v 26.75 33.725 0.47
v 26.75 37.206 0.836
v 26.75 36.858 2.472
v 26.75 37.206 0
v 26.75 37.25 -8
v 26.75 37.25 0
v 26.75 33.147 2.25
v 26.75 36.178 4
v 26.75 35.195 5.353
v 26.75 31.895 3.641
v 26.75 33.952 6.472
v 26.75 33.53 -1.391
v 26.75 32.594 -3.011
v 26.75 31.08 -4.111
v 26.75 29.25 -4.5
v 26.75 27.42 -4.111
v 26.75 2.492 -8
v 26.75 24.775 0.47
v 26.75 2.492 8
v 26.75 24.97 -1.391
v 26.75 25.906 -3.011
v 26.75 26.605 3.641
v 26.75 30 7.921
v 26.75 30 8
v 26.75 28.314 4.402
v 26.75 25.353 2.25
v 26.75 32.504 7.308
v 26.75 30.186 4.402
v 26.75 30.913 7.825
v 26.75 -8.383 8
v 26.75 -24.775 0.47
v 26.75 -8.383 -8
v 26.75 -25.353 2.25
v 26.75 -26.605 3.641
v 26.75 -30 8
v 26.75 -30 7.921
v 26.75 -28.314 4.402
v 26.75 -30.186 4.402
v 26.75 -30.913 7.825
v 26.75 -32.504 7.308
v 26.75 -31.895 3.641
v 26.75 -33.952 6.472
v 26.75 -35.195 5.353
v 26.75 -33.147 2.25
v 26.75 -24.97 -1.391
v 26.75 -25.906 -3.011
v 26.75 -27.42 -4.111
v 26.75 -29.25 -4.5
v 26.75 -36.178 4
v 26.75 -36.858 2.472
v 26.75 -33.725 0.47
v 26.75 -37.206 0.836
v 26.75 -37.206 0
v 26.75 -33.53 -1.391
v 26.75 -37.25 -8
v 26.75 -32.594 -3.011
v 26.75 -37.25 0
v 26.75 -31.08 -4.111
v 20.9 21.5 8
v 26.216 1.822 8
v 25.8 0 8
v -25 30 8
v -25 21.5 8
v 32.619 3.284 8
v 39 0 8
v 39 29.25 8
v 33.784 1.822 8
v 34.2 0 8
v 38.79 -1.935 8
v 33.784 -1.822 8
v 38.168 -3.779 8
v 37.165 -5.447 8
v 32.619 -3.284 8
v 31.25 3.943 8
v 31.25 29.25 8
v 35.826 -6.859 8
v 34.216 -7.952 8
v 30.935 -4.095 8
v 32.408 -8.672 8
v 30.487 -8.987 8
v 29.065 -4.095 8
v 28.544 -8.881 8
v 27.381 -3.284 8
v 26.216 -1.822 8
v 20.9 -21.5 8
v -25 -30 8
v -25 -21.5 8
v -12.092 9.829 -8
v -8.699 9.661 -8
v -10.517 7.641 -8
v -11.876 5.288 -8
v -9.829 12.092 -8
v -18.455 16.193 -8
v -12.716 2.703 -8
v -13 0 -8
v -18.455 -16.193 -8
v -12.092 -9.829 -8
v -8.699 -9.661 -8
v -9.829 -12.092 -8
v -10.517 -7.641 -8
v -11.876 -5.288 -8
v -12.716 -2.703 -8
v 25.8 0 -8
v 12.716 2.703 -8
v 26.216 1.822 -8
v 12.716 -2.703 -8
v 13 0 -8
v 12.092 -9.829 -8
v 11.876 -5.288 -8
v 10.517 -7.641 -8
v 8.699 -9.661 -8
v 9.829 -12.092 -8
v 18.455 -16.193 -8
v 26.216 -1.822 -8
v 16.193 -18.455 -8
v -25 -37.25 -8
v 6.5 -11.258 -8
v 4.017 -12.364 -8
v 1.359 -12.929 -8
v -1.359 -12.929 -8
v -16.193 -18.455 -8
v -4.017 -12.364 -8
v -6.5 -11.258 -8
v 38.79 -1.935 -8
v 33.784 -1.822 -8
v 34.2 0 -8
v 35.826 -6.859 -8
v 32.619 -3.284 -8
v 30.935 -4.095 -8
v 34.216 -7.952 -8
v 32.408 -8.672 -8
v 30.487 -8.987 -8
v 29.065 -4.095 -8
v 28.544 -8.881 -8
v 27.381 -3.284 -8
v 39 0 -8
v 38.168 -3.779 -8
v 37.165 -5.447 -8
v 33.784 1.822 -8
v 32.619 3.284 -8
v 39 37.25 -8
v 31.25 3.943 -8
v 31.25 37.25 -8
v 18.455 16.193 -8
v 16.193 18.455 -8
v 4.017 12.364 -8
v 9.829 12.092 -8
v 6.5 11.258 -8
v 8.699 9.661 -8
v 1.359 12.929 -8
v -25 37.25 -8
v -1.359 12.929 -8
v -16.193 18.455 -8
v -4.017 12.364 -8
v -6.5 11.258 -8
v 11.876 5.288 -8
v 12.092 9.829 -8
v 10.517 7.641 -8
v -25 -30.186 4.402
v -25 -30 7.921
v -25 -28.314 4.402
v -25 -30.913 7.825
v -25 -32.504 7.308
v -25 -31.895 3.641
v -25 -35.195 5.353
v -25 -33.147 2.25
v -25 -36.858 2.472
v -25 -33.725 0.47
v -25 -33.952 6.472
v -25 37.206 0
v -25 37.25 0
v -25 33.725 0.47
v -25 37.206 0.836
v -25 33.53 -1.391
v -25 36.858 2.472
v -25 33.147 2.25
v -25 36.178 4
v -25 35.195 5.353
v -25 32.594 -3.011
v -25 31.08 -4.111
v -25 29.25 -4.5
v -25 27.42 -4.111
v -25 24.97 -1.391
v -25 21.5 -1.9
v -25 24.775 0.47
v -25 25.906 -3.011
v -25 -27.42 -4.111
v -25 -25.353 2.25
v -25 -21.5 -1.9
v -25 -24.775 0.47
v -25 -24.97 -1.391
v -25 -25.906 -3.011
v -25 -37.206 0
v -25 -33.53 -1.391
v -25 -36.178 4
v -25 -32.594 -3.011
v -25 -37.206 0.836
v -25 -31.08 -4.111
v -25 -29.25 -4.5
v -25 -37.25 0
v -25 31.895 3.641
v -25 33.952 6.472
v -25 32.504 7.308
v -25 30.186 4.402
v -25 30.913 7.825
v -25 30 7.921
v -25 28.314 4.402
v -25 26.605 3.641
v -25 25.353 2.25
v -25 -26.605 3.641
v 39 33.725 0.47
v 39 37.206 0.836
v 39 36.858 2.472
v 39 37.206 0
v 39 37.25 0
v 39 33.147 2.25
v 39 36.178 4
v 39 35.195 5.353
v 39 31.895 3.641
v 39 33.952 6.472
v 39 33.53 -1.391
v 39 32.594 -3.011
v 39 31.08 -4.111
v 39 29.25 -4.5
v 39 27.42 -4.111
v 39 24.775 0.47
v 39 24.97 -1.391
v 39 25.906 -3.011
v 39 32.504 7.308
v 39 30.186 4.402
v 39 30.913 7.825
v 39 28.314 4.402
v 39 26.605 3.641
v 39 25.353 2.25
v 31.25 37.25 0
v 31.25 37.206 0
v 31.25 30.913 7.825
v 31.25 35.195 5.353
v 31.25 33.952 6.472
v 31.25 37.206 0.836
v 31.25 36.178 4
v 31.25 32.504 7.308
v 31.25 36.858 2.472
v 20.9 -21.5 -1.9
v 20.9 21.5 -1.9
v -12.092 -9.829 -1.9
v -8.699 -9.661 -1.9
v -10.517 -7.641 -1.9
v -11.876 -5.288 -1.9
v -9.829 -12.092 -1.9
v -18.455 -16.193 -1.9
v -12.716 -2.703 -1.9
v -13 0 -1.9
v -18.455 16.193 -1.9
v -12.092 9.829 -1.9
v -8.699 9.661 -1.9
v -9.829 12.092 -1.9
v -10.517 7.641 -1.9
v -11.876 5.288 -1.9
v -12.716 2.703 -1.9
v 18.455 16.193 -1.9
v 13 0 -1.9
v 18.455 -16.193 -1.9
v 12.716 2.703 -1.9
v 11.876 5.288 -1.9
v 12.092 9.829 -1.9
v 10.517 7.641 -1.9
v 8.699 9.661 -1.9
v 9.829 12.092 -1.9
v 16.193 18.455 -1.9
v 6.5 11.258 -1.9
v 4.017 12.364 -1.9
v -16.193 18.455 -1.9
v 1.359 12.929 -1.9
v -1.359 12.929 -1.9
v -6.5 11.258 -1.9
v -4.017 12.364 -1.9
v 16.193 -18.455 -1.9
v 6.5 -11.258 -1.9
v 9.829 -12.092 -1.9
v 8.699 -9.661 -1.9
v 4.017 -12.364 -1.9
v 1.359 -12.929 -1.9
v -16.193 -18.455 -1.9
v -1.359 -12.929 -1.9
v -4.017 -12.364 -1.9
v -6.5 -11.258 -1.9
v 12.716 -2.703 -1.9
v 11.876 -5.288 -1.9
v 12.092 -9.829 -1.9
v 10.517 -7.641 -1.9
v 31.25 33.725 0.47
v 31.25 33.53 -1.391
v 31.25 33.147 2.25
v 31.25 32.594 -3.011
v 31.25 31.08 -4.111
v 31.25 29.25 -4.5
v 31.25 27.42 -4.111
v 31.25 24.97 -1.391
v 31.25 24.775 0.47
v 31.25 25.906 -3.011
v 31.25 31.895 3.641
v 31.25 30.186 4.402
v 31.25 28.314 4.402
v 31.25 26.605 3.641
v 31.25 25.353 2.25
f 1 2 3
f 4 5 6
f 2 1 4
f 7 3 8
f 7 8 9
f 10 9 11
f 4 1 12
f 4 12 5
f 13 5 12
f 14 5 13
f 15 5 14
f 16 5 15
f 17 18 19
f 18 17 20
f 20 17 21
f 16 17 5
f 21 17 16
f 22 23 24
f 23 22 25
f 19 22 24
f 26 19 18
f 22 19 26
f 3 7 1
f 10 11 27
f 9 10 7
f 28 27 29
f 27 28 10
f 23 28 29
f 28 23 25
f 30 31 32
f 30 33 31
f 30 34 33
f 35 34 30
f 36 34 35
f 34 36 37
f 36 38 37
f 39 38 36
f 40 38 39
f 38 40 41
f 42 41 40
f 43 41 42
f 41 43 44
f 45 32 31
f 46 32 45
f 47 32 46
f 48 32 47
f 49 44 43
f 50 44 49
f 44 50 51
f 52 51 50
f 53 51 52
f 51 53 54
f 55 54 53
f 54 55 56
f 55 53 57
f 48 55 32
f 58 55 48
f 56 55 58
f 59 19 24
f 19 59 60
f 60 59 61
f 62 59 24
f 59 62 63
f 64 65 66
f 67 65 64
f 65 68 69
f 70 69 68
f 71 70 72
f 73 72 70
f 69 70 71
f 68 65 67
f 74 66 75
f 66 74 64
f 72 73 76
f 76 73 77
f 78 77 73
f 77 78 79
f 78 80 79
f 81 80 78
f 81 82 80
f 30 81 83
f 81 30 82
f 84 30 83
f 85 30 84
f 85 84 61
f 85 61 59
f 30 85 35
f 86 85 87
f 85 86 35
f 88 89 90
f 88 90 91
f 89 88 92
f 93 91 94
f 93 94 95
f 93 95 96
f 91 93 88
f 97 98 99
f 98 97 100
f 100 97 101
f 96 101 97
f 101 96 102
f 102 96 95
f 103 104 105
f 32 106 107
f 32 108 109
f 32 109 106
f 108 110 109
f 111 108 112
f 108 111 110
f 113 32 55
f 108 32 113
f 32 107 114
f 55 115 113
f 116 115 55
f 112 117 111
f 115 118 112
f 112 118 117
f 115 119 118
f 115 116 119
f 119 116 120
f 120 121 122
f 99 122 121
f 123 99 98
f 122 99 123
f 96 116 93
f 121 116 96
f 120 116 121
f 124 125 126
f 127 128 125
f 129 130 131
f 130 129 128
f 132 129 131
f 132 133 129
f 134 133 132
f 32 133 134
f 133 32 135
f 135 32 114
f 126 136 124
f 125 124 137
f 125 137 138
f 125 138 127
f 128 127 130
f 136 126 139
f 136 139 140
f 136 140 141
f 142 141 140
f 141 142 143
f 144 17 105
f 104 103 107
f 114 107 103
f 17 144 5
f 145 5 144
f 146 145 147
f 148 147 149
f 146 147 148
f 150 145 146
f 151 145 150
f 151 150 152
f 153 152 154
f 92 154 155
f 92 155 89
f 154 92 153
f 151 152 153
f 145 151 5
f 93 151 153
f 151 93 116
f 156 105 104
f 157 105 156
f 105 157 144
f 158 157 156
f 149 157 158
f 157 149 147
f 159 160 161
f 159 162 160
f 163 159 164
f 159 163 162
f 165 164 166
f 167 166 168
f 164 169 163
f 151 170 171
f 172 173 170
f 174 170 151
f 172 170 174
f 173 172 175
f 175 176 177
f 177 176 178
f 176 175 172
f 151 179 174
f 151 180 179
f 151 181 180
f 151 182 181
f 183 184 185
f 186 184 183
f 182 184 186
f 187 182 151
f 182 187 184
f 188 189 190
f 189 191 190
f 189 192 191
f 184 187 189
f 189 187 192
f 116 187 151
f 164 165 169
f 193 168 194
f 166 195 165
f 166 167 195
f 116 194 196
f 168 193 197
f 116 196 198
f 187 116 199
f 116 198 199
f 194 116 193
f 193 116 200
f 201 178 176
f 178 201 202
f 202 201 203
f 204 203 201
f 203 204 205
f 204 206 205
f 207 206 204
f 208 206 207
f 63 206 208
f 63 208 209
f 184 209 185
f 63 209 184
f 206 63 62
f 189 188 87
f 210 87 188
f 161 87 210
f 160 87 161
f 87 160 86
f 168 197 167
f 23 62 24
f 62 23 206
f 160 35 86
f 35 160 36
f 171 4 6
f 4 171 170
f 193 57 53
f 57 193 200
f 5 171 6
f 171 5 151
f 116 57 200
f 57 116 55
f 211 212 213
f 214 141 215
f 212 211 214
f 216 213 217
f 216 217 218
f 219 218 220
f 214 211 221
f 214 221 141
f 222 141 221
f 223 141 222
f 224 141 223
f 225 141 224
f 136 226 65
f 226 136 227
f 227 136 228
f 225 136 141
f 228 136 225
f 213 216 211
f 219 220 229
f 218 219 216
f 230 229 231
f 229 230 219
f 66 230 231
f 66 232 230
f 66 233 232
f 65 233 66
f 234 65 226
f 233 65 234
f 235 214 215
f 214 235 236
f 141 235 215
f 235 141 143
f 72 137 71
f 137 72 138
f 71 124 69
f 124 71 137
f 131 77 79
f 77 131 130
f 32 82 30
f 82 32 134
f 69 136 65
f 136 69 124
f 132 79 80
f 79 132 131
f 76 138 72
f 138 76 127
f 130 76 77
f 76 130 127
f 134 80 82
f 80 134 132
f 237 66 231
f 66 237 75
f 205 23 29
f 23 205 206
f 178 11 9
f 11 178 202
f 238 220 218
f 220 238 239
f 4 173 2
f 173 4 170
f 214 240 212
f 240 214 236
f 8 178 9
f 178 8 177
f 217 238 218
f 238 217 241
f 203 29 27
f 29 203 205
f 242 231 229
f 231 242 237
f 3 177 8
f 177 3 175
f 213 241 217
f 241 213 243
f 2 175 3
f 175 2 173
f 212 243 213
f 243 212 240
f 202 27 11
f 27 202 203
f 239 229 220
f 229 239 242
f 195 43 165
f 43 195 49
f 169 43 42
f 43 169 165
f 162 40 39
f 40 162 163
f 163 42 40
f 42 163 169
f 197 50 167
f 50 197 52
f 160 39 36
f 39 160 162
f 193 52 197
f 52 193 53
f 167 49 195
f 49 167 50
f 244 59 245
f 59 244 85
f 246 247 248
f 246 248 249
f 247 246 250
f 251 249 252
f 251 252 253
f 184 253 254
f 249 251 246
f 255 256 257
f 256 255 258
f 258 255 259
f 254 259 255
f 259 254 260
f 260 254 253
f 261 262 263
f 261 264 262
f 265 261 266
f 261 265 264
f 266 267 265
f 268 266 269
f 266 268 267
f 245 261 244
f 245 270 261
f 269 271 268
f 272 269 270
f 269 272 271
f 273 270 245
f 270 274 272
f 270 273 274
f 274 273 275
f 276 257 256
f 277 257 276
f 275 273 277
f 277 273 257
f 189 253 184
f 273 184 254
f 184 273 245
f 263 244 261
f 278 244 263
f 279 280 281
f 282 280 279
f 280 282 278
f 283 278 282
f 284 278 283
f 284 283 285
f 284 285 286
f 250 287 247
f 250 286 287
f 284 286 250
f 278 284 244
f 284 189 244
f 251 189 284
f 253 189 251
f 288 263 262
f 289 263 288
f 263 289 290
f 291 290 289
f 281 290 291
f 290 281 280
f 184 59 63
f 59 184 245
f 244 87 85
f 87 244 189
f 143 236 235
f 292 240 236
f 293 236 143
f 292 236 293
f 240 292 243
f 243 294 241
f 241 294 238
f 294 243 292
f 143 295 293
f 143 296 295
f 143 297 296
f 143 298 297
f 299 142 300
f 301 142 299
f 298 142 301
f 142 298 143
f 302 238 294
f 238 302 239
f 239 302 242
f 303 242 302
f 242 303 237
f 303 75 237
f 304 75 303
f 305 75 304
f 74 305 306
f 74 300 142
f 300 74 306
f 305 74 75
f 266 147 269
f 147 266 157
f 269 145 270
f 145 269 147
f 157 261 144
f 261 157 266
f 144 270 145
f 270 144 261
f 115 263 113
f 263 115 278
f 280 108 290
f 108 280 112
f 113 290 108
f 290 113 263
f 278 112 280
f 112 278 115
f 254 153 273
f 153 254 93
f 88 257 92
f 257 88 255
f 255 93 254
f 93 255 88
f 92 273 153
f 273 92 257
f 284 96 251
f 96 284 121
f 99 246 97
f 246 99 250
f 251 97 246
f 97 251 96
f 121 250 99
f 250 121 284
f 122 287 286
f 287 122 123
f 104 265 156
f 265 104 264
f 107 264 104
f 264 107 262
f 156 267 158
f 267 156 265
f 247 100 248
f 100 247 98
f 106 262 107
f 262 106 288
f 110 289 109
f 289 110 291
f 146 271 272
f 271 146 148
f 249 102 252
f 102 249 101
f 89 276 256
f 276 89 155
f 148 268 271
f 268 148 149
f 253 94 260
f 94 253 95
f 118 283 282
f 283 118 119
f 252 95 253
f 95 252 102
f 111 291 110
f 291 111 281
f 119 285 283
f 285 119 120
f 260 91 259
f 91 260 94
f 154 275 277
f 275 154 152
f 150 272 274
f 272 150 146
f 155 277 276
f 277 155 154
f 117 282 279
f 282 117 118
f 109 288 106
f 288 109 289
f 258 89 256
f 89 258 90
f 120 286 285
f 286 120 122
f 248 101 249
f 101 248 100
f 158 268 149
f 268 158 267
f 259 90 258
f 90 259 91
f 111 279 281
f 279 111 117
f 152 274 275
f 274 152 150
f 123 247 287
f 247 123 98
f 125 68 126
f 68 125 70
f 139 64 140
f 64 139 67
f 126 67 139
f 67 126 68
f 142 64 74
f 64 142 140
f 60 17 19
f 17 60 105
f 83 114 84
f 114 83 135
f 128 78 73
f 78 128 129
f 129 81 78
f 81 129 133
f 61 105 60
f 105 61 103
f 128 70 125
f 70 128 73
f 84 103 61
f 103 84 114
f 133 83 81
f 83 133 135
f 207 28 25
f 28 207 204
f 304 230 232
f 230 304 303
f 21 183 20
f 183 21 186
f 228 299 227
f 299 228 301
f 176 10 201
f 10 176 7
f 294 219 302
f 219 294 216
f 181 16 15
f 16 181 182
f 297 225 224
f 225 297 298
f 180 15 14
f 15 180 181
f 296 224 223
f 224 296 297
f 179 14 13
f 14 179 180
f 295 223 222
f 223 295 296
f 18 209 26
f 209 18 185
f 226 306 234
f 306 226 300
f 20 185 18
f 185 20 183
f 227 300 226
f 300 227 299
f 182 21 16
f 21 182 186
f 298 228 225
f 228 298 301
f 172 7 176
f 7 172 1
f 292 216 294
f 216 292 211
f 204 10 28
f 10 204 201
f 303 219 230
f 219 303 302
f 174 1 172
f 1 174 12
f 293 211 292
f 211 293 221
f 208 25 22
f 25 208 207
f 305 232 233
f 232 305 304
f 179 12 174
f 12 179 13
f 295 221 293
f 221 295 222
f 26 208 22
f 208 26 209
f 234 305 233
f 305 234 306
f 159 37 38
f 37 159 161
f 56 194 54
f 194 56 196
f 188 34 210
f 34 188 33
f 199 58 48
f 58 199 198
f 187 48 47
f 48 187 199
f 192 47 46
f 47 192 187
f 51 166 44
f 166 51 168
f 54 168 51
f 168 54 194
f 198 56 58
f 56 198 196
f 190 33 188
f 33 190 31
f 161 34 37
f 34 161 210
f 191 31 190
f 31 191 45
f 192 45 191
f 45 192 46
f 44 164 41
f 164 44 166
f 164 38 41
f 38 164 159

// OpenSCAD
// file: functions.scad
// PRUSA Mendel  
// Functions used in many files
// GNU GPL v3
// Josef Průša
// josefprusa@me.com
// prusadjs.cz
// http://www.reprap.org/wiki/Prusa_Mendel
// http://github.com/prusajr/PrusaMendel


module nut(d,h,horizontal=true){
cornerdiameter =  (d / 2) / cos (180 / 6);
cylinder(h = h, r = cornerdiameter, $fn = 6);
if(horizontal){
for(i = [1:6]){
	rotate([0,0,60*i]) translate([-cornerdiameter-0.2,0,0]) rotate([0,0,-45]) cube(size = [2,2,h]);
}}
}

// Based on nophead research
module polyhole(d,h) {
    n = max(round(2 * d),3);
    rotate([0,0,180])
        cylinder(h = h, r = (d / 2) / cos (180 / n), $fn = n);
}




module roundcorner(diameter){
	difference(){
		cube(size = [diameter,diameter,99], center = false);
		translate(v = [diameter, diameter, 0]) cylinder(h = 100, r=diameter, center=false,$fn = max(3*diameter,20));
	}
}
// file: configuration.scad
// PRUSA Mendel  
// Configuration file
// GNU GPL v2
// Josef Pra
// josefprusa@me.com
// prusadjs.cz
// http://www.reprap.org/wiki/Prusa_Mendel
// http://github.com/prusajr/PrusaMendel


// PLEASE SELECT ONE OF THE CONFIGURATIONS BELOW
// BY UN-COMMENTING IT


variant=0; //0 for metric
//variant=1; //1 for SAE
if(variant==0){
echo("variant: metric");
}else if(variant==1){
echo("variant: sae");
} else{
echo("WARNING: INVALID CONFIGURATION");
}




vars=[
//[m8_dia,m8_nut, m4_dia, m4_nut, m3_dia, m3_nut, bush_dia, mot_shaft, bush_rod, bush_outerdia, bush_length, m5_dia, m5_nut]
[9, 16.4, 5,9, 4.4, 7, 11, 5.3, 8, 16, 11, 5.6, 10],//metric
[9,15.7,5.5,10.6,5.5,10.6,11.5,5.3,7.9375,16,11,5.6, 10]//SAE
];


//BUSHING TYPE Can generate three versions
// 1 - regular old ones
// 2 - helical ones
// 3 - holders for brass or any other bought bushings
bushing_type = 2;


//Round corner diameter
round_corner_diameter = 8;


//Thin wall size
layer_height = 0.4;
perimeter_width_over_thicknes = 1.6;
infill_widht_over_thickness = 1.55;
thin_wall = 2*(perimeter_width_over_thicknes*layer_height+infill_widht_over_thickness*layer_height);
if(thin_wall<2){
	echo("Check thin wall size, its below 2mm!");
}
echo(thin_wall);


//DO NOT TOUCH THIS SECTION!
m8_diameter = vars[variant][0];
m8_nut_diameter = vars[variant][1];
m4_diameter = vars[variant][2];
m4_nut_diameter = vars[variant][3];
m3_diameter = vars[variant][4];
m3_nut_diameter = vars[variant][5];
bushing_diameter = vars[variant][6];
motor_shaft=vars[variant][7];
bushing_rodsize = vars[variant][8];
bushing_outerDiameter = vars[variant][9];
bushing_lenght = vars[variant][10];
m5_diameter = vars[variant][11];
m5_nut_diameter = vars[variant][12];



// MINI-HUXLEY VERSION (TODO, just place holder)
// include <configuration-huxley.scad>


// MEGA VERSION (TODO, just place holder)
// include <configuration-mega.scad>




// Some basic functions, probably should be somewhere else
module roundcorner(diameter){
	difference(){
		cube(size = [diameter,diameter,99], center = false);
		translate(v = [diameter, diameter, 0]) cylinder(h = 100, r=diameter, center=true);
	}
}

include <functions.scad>
// main file
// PRUSA Mendel  
// Z motor mount
// Used for mounting Z motors
// GNU GPL v2
// Josef Průša
// josefprusa@me.com
// prusadjs.cz
// http://www.reprap.org/wiki/Prusa_Mendel
// http://github.com/prusajr/PrusaMendel

// changed by theodleif
// spared m3 parts

include <configuration.scad>

/**
 * @name integrated Z motor mount
 * @category Printed
 * @using 2 m8nut
 * @using 2 m8washer
 */
 
module zmotormount(){
difference(){
	union(){
		translate(v=[2.5-3.25/2,0,0]) cube(size = [55-3.25,60,16], center = true);
		translate(v=[2.5-3.25/2,0,-4]) cube(size = [55-3.25,74.5,8], center = true);

		translate(v=[30+9/2,29.25/2,0]) cube(size = [9,29.25,16], center = true);
		translate(v=[30+9/2,29.25/2+4.2/2,0]) cube(size = [9,29.25-4.2,16], center = true);
		translate(v=[30+9/2,29.25,-4]) cube(size = [9,16,8], center = true);
		translate(v=[30,0,0]) cylinder(h = 16, r=9, center=true);
		translate(v=[30+4.5,29.25,0]) rotate(a=[0,90,0]) cylinder(h = 9, r=8, $fn=30,center=true);

		translate(v=[-25,29.25,0]) rotate(a=[0,90,0]) cylinder(h = 55, r=8, $fn=30);
		translate(v=[-25,-29.25,0]) rotate(a=[0,90,0]) cylinder(h = 55-3.25, r=8, $fn=30);
	}

translate(v=[-2.1,0,3.1]) cube(size = [46,43,10], center = true);
translate(v=[30-1,20,0]) cube(size = [4.5,40,16], center = true);


// Nema 17
rotate ([0,0,45]) translate([20,0,0]) cube(size = [9,3.2,25], center = true);
rotate ([0,0,-45]) translate([20,0,0]) cube(size = [9,3.2,25], center = true);
rotate ([0,0,135]) translate([20,0,0]) cube(size = [9,3.2,25], center = true);
rotate ([0,0,-135]) translate([20,0,0]) cube(size = [9,3.2,25], center = true);

translate(v=[0,0,-10])cylinder(h = 20, r=13);

translate(v=[30,0,-10]) cylinder(h = 20, r=4.2);

translate(v=[-26,29.25,0]) rotate(a=[0,90,0]) cylinder(h = 80, r=m8_diameter/2);
translate(v=[-26,-29.25,0]) rotate(a=[0,90,0]) cylinder(h = 58, r=m8_diameter/2);


}
}
zmotormount();
